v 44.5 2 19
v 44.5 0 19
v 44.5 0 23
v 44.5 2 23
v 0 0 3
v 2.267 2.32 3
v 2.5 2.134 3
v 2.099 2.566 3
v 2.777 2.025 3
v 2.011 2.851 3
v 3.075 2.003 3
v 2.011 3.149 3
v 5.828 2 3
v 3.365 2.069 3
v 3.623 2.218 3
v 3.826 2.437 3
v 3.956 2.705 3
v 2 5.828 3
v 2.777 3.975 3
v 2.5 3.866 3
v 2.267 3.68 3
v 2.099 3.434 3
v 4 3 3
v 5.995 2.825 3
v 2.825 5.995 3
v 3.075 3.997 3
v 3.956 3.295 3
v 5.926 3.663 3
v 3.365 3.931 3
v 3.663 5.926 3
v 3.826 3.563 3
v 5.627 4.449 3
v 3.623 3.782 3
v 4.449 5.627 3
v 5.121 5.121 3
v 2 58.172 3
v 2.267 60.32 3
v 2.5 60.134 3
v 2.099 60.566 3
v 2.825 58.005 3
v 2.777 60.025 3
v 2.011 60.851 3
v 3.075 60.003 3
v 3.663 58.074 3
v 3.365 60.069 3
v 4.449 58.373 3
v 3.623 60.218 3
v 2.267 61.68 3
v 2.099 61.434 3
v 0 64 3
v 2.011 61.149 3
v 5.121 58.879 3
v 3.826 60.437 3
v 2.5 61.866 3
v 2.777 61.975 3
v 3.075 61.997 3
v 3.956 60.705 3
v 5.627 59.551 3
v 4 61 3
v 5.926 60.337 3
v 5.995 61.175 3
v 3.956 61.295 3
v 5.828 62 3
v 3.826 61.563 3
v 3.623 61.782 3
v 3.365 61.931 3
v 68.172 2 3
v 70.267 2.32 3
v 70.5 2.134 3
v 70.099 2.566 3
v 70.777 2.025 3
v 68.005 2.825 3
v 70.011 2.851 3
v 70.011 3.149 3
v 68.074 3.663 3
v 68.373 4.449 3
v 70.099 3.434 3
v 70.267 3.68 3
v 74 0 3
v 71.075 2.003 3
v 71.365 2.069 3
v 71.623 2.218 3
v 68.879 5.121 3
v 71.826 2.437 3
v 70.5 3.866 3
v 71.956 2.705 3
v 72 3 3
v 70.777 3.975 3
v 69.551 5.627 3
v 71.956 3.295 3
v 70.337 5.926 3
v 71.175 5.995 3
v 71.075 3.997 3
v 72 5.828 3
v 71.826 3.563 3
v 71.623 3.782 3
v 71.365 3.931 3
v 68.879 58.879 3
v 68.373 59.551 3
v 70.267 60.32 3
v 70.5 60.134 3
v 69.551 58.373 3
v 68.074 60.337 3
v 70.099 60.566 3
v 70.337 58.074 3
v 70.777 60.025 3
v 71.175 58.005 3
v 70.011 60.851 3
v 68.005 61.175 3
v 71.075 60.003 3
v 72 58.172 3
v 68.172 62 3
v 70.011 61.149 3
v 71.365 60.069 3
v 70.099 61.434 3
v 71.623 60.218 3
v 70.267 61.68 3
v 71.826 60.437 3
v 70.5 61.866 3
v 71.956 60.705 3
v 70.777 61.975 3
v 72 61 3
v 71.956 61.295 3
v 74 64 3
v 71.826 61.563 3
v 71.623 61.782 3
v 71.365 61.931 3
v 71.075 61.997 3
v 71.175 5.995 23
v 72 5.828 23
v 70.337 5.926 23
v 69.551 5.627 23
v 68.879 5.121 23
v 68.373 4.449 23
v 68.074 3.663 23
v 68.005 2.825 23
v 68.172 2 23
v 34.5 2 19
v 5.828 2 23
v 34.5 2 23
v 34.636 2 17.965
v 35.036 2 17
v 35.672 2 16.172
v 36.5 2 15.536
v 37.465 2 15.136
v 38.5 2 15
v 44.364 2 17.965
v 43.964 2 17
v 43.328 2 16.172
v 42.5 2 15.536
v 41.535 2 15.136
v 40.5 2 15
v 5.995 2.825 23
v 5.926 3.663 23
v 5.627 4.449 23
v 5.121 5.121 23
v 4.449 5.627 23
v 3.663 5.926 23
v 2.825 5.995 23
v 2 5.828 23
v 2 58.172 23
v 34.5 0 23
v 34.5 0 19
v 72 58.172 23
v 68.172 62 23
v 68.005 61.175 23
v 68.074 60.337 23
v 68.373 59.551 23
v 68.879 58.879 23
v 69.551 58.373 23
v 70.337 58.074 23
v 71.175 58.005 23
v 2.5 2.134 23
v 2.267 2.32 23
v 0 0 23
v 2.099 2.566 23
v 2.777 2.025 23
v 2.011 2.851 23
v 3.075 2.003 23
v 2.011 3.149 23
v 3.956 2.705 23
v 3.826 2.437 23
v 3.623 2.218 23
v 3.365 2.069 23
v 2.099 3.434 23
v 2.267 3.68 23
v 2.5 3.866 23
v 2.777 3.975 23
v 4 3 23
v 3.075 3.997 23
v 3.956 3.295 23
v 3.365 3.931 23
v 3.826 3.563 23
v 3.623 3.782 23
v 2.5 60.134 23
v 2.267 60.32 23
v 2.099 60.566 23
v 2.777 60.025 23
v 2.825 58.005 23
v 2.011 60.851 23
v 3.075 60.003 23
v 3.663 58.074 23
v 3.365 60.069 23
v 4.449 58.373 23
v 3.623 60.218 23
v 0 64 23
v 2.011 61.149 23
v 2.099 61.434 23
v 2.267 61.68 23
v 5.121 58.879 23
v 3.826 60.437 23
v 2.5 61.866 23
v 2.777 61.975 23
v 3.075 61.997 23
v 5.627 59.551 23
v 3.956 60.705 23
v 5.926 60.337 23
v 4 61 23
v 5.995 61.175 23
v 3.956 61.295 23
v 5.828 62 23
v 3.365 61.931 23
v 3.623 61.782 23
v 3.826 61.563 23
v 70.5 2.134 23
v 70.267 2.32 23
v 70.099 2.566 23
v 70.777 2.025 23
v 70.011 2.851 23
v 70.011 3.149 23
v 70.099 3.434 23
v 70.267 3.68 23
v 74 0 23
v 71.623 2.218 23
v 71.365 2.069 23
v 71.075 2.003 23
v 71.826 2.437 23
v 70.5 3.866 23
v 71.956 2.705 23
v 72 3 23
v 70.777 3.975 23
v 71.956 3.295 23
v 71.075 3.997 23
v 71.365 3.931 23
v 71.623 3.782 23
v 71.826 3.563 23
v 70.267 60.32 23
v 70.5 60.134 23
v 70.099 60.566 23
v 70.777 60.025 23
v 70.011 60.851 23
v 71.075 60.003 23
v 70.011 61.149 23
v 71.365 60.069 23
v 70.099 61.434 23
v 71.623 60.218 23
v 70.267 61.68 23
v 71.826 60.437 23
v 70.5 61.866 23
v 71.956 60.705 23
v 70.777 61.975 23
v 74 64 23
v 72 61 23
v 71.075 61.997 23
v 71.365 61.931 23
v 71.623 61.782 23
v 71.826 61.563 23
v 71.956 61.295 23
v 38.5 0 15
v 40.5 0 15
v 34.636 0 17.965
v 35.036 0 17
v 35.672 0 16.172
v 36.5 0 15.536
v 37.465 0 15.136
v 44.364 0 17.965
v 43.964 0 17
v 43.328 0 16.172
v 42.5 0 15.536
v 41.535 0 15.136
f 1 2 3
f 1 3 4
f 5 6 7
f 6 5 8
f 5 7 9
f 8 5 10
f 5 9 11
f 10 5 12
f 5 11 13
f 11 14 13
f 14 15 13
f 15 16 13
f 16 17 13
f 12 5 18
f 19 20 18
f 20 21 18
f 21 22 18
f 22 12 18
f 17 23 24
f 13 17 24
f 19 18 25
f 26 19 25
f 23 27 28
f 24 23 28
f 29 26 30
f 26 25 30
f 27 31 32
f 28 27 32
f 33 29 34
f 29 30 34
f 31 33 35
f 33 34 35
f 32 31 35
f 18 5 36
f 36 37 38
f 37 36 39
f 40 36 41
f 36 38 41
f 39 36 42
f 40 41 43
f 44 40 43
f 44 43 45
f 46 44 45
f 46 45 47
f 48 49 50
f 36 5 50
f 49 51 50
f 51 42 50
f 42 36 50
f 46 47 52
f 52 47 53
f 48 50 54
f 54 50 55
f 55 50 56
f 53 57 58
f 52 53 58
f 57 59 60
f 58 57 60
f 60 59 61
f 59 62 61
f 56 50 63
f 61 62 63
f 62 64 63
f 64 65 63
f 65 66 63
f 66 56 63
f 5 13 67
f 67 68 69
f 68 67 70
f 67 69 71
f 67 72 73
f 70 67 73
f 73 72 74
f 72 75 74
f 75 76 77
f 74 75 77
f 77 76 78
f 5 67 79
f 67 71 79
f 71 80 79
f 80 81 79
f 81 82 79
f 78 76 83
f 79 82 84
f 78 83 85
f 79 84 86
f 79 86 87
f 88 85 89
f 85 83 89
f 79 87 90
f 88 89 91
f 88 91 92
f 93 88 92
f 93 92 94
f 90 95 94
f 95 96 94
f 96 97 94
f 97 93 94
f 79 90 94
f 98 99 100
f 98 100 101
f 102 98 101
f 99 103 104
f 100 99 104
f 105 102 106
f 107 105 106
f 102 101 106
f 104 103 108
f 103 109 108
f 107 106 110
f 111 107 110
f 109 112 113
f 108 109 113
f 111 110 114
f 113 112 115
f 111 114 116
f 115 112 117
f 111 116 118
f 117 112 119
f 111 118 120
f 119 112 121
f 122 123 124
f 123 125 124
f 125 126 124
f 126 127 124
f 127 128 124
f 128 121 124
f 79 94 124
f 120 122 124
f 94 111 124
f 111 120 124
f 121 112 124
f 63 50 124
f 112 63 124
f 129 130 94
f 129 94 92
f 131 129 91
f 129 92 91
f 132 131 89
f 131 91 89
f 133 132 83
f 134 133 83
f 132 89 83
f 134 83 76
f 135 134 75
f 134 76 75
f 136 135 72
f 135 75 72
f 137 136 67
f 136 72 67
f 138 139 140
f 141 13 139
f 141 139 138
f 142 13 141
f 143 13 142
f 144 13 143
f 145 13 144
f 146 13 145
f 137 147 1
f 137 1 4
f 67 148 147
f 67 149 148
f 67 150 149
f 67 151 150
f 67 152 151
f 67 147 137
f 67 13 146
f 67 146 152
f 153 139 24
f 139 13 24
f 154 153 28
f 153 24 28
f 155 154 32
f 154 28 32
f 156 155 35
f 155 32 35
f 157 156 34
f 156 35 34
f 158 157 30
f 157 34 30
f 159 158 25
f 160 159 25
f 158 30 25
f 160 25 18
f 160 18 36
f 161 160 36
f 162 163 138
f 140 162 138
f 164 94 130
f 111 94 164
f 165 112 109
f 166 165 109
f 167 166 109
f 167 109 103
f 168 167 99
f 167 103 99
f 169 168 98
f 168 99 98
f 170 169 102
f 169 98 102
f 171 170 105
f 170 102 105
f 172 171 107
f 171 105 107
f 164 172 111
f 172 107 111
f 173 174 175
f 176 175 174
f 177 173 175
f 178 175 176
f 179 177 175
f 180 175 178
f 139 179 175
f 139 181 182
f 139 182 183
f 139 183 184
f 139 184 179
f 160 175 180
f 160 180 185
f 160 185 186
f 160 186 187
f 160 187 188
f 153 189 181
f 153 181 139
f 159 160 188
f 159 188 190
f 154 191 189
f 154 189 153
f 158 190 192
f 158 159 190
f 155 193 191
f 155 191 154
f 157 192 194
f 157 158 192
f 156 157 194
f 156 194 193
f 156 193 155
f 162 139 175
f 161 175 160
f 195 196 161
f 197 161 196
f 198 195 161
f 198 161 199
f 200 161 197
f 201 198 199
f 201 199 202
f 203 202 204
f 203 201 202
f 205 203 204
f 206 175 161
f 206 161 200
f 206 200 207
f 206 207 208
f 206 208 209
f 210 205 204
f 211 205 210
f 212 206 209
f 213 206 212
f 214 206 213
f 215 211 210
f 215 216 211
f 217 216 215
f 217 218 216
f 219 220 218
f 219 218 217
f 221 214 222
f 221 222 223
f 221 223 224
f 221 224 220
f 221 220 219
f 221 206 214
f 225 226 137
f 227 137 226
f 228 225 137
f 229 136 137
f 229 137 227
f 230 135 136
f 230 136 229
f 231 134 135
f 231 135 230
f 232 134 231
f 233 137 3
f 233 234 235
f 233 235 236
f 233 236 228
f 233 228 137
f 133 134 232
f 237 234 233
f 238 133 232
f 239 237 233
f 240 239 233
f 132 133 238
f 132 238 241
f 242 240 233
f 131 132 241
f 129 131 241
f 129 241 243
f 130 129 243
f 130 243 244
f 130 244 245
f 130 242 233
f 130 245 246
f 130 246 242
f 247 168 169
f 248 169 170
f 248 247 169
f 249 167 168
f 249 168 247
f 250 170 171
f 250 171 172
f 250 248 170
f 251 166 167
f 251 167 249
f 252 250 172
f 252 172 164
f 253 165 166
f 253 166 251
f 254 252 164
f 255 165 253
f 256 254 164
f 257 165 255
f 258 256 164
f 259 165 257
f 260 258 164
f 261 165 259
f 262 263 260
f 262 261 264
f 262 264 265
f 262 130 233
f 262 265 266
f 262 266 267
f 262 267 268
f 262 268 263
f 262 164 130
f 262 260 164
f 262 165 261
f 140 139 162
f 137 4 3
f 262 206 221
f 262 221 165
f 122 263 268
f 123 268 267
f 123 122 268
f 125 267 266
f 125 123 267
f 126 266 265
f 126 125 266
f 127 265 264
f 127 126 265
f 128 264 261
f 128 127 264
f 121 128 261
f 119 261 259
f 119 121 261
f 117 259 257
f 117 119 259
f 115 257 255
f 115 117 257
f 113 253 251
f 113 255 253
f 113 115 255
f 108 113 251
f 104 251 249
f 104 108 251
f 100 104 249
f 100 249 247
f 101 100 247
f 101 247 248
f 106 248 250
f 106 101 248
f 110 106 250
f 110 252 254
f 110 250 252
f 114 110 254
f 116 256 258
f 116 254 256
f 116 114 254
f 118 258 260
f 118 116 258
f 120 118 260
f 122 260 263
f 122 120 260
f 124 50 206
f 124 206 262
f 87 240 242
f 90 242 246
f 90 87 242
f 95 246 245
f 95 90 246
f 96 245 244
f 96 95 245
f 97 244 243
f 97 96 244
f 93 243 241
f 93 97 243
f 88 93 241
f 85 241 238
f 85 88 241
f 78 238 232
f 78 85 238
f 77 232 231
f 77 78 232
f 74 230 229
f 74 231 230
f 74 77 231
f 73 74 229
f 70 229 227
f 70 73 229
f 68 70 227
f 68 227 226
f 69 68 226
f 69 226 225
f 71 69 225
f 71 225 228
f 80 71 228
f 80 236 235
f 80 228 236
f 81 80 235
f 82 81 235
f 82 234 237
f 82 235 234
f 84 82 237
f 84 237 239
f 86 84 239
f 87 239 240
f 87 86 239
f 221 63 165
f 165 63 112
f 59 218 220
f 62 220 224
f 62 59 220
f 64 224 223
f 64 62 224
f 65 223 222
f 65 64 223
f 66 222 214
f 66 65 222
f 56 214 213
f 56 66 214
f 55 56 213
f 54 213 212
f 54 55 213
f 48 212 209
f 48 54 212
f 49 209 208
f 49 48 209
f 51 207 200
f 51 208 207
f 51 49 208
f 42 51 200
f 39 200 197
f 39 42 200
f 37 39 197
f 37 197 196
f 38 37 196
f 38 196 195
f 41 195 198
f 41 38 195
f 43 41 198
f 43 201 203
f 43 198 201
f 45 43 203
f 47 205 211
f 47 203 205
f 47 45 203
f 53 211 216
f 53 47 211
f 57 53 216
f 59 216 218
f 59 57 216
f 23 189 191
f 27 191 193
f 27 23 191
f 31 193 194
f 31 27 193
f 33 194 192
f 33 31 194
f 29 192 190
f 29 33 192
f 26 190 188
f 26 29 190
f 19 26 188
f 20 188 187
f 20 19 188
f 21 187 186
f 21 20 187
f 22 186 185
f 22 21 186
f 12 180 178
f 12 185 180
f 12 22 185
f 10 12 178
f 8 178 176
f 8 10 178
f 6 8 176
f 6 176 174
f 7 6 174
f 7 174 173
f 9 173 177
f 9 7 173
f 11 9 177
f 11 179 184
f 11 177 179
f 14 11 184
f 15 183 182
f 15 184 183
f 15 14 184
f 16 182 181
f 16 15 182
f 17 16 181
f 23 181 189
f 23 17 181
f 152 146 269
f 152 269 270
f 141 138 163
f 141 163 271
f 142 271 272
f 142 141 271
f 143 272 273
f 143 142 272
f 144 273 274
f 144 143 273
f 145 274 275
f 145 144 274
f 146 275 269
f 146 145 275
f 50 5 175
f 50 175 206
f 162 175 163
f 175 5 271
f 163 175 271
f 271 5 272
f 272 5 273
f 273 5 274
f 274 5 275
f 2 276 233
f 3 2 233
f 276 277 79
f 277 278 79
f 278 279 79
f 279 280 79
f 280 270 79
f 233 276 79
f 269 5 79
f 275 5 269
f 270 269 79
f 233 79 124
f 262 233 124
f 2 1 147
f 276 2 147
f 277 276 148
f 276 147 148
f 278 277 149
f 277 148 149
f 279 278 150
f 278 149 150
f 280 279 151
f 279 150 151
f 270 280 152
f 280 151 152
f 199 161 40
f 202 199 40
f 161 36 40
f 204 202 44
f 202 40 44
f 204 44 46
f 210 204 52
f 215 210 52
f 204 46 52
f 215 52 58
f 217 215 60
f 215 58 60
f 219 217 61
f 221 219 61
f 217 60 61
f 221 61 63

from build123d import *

# Parameters (mm, degrees)
BOX010_W          = 10
BOX010_H          = 10
BOX010_DEPTH      = 10
FILLET001_R       = 4
BOX008_W          = 70
BOX008_H          = 60
BOX008_DEPTH      = 20
BOX007_W          = 74
BOX007_H          = 64
BOX007_DEPTH      = 20
CYLINDER007_R     = 1
CYLINDER007_DEPTH = 20
CYLINDER006_R     = 3
CYLINDER006_DEPTH = 20
ARRAY004_X_COUNT  = 2
ARRAY004_X_PITCH  = 68
ARRAY004_Y_COUNT  = 2
ARRAY004_Y_PITCH  = 58


with BuildPart() as fillet001:
    # Box010 → Box010 (new body)
    with BuildSketch(Plane(origin=(34.5, -4.5, 15), x_dir=(1, 0, 0), z_dir=(0, 0, 1))):
        with Locations((5, 5)):
            Rectangle(BOX010_W, BOX010_H)
    extrude(amount=BOX010_DEPTH)

    # Fillet001
    fillet001_edges = [fillet001.edges().sort_by_distance(p)[0] for p in [
        (34.5, 0.5, 15),
        (44.5, 0.5, 15),
    ]]
    fillet(fillet001_edges, radius=FILLET001_R)


with BuildPart() as wall_inner_extraction:
    # Box008 → Box008 (new body)
    with BuildSketch(Plane(origin=(2, 2, 0), x_dir=(1, 0, 0), z_dir=(0, 0, 1))):
        with Locations((35, 30)):
            Rectangle(BOX008_W, BOX008_H)
    extrude(amount=BOX008_DEPTH)


with BuildPart() as wall_box_cut:
    # Box007 → Box007 (new body)
    with BuildSketch(Plane.XY):
        with Locations((37, 32)):
            Rectangle(BOX007_W, BOX007_H)
    extrude(amount=BOX007_DEPTH)

    # Cut004: cut wall inner extraction
    add(wall_inner_extraction.part, mode=Mode.SUBTRACT)


with BuildPart() as wall_box_hole:
    # Cylinder007 → Cylinder007 (new body)
    with BuildSketch(Plane.XY):
        Circle(CYLINDER007_R)
    extrude(amount=CYLINDER007_DEPTH)


with BuildPart() as wall_fusion_cut:
    # Cylinder006 → Cylinder006 (new body)
    with BuildSketch(Plane.XY):
        Circle(CYLINDER006_R)
    extrude(amount=CYLINDER006_DEPTH)

    # Cut005: cut wall box hole
    add(wall_box_hole.part, mode=Mode.SUBTRACT)


with BuildPart() as wall_fusion_cut_1:
    # Cut005 placement: moved
    add(wall_fusion_cut.part.moved(Location((3, 3, 0))))

    # Array004 X: wall fusion cut ×2


with BuildPart() as wall_fusion_cut_2:
    add(wall_fusion_cut_1.part)
    with Locations(*[(i * ARRAY004_X_PITCH, 0, 0) for i in range(1, ARRAY004_X_COUNT)]):
        add(wall_fusion_cut_1.part)

    # Array004 Y: wall fusion cut ×2


with BuildPart() as wall_fusion_cut_3:
    add(wall_fusion_cut_2.part)
    with Locations(*[(0, i * ARRAY004_Y_PITCH, 0) for i in range(1, ARRAY004_Y_COUNT)]):
        add(wall_fusion_cut_2.part)

    # Fusion003: union wall box cut
    add(wall_box_cut.part)


with BuildPart() as wall_fusion_cut_4:
    # Fusion003 placement: moved
    add(wall_fusion_cut_3.part.moved(Location((0, 0, 3))))

    # Cut007: cut Fillet001
    add(fillet001.part, mode=Mode.SUBTRACT)


solid = wall_fusion_cut_4.part
